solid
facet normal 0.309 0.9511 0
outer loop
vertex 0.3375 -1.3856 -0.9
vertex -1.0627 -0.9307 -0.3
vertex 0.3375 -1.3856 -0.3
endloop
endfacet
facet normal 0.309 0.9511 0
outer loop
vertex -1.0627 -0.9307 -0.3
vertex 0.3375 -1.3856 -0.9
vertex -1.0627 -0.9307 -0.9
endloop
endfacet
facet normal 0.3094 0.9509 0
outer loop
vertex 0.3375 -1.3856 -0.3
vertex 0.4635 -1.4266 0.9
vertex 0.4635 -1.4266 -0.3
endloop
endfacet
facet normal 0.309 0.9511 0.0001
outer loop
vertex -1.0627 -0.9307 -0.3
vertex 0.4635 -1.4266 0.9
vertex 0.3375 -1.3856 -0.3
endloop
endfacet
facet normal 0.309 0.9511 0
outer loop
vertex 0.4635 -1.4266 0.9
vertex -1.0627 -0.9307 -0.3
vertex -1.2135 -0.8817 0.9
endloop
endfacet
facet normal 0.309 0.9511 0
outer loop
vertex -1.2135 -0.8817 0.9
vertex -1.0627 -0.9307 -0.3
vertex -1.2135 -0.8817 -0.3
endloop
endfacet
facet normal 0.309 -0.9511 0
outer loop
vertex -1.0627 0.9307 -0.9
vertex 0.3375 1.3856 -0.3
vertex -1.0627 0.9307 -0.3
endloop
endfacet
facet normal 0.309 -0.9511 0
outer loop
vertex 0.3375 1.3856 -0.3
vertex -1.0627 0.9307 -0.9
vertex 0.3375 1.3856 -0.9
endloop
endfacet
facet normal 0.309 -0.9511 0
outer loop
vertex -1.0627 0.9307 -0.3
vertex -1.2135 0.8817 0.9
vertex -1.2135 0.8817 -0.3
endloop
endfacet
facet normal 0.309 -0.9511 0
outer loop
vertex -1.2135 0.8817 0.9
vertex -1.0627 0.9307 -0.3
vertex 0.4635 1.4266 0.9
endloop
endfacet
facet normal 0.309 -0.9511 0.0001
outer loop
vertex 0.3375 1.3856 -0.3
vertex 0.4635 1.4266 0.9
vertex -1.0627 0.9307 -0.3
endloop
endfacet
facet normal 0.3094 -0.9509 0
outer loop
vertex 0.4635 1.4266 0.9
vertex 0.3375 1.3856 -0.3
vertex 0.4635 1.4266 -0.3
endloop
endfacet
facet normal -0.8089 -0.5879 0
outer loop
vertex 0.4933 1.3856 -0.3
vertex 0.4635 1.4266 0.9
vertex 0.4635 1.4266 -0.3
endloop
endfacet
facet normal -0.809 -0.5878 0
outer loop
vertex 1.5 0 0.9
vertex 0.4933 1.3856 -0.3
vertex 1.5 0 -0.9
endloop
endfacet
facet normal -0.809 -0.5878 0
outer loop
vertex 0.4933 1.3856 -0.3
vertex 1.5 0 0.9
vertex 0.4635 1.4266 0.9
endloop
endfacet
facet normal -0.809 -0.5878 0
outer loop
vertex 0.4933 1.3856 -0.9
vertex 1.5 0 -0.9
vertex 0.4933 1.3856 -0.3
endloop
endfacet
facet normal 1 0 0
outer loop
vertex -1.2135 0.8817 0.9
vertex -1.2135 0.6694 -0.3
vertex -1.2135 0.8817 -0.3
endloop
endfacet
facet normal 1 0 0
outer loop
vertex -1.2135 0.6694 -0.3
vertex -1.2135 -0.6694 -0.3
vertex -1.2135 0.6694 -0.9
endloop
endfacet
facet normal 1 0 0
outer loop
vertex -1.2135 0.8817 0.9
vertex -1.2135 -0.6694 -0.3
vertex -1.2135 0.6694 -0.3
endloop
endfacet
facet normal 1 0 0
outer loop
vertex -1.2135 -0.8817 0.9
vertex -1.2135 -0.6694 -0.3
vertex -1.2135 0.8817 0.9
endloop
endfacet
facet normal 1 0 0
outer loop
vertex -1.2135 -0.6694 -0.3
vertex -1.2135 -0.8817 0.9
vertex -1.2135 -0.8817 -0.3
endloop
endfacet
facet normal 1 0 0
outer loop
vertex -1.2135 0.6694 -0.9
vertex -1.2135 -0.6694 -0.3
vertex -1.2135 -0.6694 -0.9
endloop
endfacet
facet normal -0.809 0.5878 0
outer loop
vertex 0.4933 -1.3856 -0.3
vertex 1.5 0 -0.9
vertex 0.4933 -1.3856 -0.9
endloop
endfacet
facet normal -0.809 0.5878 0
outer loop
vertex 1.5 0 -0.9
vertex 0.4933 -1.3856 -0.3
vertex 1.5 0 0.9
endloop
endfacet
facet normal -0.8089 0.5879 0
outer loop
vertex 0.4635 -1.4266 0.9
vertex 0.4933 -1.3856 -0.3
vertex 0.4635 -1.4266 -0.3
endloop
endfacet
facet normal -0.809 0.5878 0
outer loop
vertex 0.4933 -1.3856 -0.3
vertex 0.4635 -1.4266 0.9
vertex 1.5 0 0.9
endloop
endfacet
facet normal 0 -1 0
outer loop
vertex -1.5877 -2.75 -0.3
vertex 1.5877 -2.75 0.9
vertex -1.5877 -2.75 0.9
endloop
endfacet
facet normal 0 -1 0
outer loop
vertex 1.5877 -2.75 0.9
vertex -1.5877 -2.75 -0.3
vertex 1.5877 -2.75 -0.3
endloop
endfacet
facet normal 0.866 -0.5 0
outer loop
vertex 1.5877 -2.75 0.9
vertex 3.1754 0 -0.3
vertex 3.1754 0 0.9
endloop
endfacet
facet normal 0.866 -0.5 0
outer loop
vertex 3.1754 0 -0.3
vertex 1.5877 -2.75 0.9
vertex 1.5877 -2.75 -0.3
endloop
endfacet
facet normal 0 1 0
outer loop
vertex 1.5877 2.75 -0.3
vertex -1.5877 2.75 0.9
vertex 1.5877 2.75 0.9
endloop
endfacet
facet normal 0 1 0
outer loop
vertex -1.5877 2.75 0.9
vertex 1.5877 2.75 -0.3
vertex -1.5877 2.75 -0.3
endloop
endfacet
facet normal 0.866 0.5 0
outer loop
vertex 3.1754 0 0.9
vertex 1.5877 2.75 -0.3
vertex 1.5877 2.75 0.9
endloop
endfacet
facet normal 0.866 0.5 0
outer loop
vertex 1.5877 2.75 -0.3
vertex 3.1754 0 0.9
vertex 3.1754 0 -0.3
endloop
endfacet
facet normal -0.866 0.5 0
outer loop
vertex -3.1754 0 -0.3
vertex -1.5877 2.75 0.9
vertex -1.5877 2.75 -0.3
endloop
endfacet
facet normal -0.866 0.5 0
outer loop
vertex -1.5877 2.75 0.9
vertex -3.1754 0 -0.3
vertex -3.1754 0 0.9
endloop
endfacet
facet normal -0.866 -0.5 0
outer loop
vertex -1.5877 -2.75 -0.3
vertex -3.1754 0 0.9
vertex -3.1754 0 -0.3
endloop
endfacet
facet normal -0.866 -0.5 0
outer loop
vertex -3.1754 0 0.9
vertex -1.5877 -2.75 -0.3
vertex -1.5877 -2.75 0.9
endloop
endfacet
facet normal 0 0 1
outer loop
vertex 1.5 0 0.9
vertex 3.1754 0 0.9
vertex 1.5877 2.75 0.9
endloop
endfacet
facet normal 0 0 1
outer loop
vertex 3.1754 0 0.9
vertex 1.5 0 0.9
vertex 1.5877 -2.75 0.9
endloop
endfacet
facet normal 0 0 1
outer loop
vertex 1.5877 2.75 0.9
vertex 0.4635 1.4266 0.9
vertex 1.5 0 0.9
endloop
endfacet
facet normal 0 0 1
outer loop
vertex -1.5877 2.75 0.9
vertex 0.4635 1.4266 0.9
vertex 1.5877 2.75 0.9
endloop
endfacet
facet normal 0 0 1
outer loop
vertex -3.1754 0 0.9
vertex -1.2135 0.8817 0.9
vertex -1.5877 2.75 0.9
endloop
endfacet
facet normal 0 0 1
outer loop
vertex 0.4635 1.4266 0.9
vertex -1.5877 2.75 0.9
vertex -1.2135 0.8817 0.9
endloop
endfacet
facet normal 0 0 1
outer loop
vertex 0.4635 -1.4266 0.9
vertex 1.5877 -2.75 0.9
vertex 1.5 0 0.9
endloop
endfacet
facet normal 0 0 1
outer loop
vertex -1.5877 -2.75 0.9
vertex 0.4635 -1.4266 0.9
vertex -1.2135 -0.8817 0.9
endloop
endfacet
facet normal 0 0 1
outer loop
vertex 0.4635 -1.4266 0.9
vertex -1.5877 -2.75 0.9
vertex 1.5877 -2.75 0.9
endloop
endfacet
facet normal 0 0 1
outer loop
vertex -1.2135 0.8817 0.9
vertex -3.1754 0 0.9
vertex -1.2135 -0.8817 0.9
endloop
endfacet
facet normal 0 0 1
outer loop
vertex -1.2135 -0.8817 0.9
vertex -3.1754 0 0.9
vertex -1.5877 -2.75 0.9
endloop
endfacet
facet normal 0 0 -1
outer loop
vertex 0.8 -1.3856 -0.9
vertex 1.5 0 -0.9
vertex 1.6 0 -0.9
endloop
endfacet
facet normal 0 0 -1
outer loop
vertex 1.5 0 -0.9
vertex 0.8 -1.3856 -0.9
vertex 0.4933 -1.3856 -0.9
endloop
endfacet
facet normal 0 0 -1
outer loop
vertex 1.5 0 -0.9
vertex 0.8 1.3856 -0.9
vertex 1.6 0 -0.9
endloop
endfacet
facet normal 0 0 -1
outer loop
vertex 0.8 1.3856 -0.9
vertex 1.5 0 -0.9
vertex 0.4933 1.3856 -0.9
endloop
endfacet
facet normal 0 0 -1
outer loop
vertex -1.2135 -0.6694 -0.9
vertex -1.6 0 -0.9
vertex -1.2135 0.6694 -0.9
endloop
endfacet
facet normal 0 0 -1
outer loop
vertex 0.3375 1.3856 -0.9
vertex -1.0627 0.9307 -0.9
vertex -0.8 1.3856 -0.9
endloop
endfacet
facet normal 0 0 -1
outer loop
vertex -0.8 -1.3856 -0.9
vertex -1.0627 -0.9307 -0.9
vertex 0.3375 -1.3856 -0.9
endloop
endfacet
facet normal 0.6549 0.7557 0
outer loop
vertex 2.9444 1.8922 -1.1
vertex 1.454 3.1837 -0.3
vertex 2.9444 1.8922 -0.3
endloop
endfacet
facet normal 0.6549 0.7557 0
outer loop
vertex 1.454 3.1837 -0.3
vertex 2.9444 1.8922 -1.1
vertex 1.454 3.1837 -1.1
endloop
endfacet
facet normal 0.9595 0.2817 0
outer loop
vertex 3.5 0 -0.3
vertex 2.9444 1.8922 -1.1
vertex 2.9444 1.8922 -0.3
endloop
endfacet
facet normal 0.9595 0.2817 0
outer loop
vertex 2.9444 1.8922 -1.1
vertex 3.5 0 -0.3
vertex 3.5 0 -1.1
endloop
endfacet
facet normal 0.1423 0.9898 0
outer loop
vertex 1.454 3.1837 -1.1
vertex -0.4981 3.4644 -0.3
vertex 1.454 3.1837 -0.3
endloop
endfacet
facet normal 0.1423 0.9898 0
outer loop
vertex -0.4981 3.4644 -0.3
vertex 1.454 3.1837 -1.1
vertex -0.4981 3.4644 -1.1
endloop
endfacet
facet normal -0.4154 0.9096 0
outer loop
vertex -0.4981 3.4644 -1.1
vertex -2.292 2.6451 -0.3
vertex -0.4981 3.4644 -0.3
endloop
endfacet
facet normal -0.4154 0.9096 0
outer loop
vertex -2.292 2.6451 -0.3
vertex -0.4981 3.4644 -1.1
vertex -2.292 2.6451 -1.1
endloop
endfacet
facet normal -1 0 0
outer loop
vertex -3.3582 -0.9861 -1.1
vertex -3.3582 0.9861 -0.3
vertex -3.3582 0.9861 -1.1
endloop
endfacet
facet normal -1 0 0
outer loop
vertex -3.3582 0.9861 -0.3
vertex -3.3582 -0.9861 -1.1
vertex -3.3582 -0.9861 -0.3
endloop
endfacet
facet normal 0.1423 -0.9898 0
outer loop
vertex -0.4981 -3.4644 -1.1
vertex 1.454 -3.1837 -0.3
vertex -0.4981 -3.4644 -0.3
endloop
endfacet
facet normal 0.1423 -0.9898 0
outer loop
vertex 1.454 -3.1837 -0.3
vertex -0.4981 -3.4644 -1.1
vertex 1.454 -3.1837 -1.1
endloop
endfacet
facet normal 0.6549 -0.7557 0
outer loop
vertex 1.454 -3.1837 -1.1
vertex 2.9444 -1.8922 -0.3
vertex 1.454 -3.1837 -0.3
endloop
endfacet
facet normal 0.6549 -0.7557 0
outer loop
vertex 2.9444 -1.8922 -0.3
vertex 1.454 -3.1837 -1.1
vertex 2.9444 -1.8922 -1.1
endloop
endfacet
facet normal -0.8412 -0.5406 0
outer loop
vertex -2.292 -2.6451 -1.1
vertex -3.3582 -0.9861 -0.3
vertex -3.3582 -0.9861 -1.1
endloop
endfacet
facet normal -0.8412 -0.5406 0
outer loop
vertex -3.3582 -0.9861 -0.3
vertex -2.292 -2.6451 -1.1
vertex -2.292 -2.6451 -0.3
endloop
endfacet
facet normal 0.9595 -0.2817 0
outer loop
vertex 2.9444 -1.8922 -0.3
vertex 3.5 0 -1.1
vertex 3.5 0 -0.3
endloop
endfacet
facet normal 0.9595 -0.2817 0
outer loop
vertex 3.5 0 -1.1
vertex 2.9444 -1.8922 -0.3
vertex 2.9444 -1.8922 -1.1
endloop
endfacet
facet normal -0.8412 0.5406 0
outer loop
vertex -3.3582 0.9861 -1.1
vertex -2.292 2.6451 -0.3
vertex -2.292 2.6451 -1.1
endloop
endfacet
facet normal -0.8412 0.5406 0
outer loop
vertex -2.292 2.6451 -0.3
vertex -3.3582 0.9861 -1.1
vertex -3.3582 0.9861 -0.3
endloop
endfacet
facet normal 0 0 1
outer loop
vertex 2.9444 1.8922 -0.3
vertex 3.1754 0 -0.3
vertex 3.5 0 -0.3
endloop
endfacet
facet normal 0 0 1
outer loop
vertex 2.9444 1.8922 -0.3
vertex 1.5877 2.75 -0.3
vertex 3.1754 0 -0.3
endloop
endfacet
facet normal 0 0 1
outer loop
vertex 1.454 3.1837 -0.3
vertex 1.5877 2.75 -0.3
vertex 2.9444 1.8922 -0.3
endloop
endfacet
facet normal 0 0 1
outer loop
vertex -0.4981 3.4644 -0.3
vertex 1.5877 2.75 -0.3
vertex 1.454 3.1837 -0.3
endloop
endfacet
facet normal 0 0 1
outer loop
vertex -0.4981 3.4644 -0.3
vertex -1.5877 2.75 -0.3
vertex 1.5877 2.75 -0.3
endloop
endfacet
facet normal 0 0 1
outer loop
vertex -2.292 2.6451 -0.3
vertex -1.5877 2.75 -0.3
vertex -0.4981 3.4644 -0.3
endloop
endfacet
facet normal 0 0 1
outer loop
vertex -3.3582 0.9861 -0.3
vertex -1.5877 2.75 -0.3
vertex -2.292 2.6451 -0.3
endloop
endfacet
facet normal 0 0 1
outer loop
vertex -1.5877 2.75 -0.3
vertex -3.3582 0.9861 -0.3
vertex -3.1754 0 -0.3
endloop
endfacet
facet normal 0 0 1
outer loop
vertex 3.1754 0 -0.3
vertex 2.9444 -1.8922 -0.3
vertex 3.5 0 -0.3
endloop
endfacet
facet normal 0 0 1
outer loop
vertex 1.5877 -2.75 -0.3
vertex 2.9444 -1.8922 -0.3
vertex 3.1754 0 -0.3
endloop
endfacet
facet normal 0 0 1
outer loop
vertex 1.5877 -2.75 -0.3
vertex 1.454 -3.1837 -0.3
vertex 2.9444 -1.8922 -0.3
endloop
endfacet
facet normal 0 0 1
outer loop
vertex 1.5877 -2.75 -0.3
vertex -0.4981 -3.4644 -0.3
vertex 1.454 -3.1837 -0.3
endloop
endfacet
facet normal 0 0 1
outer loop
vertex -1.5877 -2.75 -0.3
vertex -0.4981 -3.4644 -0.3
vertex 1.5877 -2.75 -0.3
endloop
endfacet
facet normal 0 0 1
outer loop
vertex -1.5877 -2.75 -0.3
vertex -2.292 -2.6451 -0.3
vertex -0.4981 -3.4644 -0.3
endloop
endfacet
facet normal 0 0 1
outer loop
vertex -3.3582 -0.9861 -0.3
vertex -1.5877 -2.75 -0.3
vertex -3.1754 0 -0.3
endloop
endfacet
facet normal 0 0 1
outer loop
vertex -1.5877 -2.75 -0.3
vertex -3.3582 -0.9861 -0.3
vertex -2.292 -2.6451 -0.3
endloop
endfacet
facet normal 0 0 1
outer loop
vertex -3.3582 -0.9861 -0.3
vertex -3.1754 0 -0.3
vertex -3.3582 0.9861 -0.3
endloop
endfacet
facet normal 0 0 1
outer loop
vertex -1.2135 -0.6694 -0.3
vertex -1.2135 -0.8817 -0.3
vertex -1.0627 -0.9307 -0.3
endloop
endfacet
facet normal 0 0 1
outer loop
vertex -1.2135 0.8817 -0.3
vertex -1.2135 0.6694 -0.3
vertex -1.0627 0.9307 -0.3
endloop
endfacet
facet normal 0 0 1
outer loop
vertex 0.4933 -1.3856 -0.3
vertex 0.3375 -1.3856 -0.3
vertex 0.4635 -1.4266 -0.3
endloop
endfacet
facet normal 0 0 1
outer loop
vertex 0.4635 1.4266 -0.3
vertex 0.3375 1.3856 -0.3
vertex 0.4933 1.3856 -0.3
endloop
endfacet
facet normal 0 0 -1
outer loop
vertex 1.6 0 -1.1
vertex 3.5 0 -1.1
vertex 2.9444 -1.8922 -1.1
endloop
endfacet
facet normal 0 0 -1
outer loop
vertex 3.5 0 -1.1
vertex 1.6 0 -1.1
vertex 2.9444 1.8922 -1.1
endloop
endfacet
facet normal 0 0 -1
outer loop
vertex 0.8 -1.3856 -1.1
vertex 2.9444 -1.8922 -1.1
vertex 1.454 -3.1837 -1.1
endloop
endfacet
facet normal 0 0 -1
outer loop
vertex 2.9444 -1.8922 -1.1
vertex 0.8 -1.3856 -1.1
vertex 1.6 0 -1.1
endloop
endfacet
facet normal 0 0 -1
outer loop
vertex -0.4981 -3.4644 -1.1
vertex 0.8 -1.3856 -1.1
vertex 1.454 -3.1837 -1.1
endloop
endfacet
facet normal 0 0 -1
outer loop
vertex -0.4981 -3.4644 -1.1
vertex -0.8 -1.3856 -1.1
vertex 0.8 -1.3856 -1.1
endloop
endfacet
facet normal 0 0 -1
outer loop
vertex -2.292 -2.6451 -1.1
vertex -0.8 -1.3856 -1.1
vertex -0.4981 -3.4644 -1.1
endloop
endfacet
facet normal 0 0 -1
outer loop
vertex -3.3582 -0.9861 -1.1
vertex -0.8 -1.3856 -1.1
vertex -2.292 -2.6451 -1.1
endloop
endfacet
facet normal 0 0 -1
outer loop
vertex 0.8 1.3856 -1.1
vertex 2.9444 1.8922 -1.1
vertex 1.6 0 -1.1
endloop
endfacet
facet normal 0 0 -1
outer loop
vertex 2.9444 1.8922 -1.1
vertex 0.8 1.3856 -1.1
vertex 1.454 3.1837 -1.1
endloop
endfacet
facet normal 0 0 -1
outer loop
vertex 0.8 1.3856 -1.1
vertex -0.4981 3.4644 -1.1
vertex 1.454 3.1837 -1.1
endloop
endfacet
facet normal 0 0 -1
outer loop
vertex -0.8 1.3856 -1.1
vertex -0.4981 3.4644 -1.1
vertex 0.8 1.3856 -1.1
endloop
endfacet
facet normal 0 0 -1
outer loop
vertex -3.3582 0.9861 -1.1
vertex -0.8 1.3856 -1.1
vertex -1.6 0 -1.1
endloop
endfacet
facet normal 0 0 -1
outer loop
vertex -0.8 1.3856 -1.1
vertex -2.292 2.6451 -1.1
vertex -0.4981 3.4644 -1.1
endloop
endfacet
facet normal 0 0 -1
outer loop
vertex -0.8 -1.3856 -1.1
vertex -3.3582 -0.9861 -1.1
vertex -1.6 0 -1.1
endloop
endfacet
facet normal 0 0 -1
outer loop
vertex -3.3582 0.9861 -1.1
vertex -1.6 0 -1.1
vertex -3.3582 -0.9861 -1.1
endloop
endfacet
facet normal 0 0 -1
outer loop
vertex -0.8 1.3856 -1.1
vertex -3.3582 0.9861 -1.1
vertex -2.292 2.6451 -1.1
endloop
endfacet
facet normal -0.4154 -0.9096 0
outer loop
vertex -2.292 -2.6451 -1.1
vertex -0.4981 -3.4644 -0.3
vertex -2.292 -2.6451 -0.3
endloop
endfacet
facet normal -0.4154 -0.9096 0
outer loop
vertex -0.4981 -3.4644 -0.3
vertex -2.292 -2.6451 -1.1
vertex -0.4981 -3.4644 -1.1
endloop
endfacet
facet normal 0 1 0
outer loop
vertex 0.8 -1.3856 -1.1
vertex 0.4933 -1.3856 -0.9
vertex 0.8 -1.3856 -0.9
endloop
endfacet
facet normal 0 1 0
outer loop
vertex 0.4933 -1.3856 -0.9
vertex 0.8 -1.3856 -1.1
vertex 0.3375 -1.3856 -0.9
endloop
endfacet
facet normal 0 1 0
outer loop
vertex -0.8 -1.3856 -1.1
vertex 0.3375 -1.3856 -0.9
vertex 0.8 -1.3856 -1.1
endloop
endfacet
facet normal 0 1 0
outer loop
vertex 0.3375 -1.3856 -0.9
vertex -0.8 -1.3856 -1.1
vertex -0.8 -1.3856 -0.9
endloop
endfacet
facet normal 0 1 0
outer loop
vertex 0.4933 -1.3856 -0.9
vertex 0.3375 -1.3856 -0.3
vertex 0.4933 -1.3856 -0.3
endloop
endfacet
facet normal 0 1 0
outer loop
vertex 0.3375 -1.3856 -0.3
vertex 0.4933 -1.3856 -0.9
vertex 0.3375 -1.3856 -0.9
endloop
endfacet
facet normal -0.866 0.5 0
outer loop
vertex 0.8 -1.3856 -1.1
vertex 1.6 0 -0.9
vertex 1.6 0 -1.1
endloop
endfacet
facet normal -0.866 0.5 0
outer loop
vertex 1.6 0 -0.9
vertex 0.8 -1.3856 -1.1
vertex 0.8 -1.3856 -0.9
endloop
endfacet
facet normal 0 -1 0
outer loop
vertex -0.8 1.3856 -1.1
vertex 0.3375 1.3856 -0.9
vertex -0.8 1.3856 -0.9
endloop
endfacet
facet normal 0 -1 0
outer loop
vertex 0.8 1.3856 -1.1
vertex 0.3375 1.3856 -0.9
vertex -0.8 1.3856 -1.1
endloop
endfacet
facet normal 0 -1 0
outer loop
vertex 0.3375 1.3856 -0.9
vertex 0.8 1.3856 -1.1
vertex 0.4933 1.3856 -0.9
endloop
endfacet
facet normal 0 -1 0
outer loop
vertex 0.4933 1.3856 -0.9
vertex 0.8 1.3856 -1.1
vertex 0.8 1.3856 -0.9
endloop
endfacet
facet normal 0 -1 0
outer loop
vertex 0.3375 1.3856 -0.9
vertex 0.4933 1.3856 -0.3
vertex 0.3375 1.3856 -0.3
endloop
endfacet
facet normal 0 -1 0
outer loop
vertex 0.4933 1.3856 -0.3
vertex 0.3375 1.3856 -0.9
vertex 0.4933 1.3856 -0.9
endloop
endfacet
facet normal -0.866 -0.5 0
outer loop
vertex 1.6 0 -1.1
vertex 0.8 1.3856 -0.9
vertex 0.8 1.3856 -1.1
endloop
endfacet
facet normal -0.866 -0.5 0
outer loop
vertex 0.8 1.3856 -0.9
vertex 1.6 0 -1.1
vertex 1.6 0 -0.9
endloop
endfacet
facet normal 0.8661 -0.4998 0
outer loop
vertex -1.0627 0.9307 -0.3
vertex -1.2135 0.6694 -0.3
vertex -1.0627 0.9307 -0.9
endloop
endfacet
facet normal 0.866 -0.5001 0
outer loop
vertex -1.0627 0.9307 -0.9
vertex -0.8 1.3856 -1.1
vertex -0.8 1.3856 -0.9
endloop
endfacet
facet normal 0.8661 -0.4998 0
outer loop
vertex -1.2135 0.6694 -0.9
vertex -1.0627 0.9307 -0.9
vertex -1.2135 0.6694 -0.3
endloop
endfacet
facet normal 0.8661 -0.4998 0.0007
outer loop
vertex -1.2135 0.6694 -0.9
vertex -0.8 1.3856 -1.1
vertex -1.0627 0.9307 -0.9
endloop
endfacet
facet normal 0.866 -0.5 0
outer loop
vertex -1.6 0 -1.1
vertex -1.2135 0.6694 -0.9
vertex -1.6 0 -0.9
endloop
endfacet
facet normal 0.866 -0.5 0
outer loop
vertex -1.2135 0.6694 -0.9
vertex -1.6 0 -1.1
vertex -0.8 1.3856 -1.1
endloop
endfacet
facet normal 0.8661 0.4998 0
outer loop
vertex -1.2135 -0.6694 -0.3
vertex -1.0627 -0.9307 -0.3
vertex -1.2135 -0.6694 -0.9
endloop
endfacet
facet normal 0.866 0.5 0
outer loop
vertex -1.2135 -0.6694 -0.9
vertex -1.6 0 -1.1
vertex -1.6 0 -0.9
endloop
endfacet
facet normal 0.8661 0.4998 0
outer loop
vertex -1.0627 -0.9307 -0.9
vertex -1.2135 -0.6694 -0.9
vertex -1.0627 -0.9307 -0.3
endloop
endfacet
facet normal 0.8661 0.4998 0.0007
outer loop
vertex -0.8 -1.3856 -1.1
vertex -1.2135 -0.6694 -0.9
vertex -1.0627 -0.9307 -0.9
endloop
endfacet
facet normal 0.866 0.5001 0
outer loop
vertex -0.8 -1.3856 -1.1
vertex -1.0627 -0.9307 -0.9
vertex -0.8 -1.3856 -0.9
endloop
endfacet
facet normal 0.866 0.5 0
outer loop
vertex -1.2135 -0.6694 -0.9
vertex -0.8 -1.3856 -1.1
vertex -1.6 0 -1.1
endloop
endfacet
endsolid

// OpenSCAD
// Parameters
thread_nominal_diameter_mm = 3; //[1.5:6:0.1]
across_flats_mm = 5.5; //[2.75:11:0.1]
thickness_mm = 1.8; //[0.9:3.6:0.1]
hole_diameter_mm = 3; //[2.4:3.6:0.05]
outer_profile_sides = 6; //[6:6:1]
chamfer_mm = 0.2; //[0.1:0.6:0.05]
overlap_mm = 0.6; //[0.2:1.5:0.1]
washer_outer_diameter_mm = 7; //[5:14:0.1]
washer_thickness_mm = 0.8; //[0.4:1.6:0.1]
washer_hole_diameter_mm = 3.2; //[2.8:4:0.05]

// Hex Nut - complete geometry
module hex_nut() {
  color("DimGray") {
    difference() {
      // Hexagonal body
      cylinder(h=thickness_mm, r=across_flats_mm/(2*cos(30)), $fn=outer_profile_sides, center=true);
      // Central through-hole with chamfers
      union() {
        // Central hole
        cylinder(h=thickness_mm + 2*overlap_mm, r=hole_diameter_mm/2, center=true);
        // Top chamfer
        translate([0, 0, thickness_mm/2 - chamfer_mm/2 + overlap_mm/2])
          rotate([180, 0, 0])
          cylinder(h=chamfer_mm, r1=hole_diameter_mm/2 + chamfer_mm, r2=hole_diameter_mm/2, center=true);
        // Bottom chamfer
        translate([0, 0, -thickness_mm/2 + chamfer_mm/2 - overlap_mm/2])
          cylinder(h=chamfer_mm, r1=hole_diameter_mm/2 + chamfer_mm, r2=hole_diameter_mm/2, center=true);
      }
    }
  }
}

// Washer - complete geometry
module washer() {
  color("Silver") {
    difference() {
      // Outer washer
      cylinder(h=washer_thickness_mm, r=washer_outer_diameter_mm/2, center=true);
      // Inner hole
      cylinder(h=washer_thickness_mm + 2*overlap_mm, r=washer_hole_diameter_mm/2, center=true);
    }
  }
}

// Nut and Washer Assembly
module nut_and_washer() {
  hex_nut();
  translate([0, 0, -(thickness_mm/2 + washer_thickness_mm/2 - overlap_mm)]) washer();
}

// Final Assembly
module assembly() {
  nut_and_washer();
}

assembly();
